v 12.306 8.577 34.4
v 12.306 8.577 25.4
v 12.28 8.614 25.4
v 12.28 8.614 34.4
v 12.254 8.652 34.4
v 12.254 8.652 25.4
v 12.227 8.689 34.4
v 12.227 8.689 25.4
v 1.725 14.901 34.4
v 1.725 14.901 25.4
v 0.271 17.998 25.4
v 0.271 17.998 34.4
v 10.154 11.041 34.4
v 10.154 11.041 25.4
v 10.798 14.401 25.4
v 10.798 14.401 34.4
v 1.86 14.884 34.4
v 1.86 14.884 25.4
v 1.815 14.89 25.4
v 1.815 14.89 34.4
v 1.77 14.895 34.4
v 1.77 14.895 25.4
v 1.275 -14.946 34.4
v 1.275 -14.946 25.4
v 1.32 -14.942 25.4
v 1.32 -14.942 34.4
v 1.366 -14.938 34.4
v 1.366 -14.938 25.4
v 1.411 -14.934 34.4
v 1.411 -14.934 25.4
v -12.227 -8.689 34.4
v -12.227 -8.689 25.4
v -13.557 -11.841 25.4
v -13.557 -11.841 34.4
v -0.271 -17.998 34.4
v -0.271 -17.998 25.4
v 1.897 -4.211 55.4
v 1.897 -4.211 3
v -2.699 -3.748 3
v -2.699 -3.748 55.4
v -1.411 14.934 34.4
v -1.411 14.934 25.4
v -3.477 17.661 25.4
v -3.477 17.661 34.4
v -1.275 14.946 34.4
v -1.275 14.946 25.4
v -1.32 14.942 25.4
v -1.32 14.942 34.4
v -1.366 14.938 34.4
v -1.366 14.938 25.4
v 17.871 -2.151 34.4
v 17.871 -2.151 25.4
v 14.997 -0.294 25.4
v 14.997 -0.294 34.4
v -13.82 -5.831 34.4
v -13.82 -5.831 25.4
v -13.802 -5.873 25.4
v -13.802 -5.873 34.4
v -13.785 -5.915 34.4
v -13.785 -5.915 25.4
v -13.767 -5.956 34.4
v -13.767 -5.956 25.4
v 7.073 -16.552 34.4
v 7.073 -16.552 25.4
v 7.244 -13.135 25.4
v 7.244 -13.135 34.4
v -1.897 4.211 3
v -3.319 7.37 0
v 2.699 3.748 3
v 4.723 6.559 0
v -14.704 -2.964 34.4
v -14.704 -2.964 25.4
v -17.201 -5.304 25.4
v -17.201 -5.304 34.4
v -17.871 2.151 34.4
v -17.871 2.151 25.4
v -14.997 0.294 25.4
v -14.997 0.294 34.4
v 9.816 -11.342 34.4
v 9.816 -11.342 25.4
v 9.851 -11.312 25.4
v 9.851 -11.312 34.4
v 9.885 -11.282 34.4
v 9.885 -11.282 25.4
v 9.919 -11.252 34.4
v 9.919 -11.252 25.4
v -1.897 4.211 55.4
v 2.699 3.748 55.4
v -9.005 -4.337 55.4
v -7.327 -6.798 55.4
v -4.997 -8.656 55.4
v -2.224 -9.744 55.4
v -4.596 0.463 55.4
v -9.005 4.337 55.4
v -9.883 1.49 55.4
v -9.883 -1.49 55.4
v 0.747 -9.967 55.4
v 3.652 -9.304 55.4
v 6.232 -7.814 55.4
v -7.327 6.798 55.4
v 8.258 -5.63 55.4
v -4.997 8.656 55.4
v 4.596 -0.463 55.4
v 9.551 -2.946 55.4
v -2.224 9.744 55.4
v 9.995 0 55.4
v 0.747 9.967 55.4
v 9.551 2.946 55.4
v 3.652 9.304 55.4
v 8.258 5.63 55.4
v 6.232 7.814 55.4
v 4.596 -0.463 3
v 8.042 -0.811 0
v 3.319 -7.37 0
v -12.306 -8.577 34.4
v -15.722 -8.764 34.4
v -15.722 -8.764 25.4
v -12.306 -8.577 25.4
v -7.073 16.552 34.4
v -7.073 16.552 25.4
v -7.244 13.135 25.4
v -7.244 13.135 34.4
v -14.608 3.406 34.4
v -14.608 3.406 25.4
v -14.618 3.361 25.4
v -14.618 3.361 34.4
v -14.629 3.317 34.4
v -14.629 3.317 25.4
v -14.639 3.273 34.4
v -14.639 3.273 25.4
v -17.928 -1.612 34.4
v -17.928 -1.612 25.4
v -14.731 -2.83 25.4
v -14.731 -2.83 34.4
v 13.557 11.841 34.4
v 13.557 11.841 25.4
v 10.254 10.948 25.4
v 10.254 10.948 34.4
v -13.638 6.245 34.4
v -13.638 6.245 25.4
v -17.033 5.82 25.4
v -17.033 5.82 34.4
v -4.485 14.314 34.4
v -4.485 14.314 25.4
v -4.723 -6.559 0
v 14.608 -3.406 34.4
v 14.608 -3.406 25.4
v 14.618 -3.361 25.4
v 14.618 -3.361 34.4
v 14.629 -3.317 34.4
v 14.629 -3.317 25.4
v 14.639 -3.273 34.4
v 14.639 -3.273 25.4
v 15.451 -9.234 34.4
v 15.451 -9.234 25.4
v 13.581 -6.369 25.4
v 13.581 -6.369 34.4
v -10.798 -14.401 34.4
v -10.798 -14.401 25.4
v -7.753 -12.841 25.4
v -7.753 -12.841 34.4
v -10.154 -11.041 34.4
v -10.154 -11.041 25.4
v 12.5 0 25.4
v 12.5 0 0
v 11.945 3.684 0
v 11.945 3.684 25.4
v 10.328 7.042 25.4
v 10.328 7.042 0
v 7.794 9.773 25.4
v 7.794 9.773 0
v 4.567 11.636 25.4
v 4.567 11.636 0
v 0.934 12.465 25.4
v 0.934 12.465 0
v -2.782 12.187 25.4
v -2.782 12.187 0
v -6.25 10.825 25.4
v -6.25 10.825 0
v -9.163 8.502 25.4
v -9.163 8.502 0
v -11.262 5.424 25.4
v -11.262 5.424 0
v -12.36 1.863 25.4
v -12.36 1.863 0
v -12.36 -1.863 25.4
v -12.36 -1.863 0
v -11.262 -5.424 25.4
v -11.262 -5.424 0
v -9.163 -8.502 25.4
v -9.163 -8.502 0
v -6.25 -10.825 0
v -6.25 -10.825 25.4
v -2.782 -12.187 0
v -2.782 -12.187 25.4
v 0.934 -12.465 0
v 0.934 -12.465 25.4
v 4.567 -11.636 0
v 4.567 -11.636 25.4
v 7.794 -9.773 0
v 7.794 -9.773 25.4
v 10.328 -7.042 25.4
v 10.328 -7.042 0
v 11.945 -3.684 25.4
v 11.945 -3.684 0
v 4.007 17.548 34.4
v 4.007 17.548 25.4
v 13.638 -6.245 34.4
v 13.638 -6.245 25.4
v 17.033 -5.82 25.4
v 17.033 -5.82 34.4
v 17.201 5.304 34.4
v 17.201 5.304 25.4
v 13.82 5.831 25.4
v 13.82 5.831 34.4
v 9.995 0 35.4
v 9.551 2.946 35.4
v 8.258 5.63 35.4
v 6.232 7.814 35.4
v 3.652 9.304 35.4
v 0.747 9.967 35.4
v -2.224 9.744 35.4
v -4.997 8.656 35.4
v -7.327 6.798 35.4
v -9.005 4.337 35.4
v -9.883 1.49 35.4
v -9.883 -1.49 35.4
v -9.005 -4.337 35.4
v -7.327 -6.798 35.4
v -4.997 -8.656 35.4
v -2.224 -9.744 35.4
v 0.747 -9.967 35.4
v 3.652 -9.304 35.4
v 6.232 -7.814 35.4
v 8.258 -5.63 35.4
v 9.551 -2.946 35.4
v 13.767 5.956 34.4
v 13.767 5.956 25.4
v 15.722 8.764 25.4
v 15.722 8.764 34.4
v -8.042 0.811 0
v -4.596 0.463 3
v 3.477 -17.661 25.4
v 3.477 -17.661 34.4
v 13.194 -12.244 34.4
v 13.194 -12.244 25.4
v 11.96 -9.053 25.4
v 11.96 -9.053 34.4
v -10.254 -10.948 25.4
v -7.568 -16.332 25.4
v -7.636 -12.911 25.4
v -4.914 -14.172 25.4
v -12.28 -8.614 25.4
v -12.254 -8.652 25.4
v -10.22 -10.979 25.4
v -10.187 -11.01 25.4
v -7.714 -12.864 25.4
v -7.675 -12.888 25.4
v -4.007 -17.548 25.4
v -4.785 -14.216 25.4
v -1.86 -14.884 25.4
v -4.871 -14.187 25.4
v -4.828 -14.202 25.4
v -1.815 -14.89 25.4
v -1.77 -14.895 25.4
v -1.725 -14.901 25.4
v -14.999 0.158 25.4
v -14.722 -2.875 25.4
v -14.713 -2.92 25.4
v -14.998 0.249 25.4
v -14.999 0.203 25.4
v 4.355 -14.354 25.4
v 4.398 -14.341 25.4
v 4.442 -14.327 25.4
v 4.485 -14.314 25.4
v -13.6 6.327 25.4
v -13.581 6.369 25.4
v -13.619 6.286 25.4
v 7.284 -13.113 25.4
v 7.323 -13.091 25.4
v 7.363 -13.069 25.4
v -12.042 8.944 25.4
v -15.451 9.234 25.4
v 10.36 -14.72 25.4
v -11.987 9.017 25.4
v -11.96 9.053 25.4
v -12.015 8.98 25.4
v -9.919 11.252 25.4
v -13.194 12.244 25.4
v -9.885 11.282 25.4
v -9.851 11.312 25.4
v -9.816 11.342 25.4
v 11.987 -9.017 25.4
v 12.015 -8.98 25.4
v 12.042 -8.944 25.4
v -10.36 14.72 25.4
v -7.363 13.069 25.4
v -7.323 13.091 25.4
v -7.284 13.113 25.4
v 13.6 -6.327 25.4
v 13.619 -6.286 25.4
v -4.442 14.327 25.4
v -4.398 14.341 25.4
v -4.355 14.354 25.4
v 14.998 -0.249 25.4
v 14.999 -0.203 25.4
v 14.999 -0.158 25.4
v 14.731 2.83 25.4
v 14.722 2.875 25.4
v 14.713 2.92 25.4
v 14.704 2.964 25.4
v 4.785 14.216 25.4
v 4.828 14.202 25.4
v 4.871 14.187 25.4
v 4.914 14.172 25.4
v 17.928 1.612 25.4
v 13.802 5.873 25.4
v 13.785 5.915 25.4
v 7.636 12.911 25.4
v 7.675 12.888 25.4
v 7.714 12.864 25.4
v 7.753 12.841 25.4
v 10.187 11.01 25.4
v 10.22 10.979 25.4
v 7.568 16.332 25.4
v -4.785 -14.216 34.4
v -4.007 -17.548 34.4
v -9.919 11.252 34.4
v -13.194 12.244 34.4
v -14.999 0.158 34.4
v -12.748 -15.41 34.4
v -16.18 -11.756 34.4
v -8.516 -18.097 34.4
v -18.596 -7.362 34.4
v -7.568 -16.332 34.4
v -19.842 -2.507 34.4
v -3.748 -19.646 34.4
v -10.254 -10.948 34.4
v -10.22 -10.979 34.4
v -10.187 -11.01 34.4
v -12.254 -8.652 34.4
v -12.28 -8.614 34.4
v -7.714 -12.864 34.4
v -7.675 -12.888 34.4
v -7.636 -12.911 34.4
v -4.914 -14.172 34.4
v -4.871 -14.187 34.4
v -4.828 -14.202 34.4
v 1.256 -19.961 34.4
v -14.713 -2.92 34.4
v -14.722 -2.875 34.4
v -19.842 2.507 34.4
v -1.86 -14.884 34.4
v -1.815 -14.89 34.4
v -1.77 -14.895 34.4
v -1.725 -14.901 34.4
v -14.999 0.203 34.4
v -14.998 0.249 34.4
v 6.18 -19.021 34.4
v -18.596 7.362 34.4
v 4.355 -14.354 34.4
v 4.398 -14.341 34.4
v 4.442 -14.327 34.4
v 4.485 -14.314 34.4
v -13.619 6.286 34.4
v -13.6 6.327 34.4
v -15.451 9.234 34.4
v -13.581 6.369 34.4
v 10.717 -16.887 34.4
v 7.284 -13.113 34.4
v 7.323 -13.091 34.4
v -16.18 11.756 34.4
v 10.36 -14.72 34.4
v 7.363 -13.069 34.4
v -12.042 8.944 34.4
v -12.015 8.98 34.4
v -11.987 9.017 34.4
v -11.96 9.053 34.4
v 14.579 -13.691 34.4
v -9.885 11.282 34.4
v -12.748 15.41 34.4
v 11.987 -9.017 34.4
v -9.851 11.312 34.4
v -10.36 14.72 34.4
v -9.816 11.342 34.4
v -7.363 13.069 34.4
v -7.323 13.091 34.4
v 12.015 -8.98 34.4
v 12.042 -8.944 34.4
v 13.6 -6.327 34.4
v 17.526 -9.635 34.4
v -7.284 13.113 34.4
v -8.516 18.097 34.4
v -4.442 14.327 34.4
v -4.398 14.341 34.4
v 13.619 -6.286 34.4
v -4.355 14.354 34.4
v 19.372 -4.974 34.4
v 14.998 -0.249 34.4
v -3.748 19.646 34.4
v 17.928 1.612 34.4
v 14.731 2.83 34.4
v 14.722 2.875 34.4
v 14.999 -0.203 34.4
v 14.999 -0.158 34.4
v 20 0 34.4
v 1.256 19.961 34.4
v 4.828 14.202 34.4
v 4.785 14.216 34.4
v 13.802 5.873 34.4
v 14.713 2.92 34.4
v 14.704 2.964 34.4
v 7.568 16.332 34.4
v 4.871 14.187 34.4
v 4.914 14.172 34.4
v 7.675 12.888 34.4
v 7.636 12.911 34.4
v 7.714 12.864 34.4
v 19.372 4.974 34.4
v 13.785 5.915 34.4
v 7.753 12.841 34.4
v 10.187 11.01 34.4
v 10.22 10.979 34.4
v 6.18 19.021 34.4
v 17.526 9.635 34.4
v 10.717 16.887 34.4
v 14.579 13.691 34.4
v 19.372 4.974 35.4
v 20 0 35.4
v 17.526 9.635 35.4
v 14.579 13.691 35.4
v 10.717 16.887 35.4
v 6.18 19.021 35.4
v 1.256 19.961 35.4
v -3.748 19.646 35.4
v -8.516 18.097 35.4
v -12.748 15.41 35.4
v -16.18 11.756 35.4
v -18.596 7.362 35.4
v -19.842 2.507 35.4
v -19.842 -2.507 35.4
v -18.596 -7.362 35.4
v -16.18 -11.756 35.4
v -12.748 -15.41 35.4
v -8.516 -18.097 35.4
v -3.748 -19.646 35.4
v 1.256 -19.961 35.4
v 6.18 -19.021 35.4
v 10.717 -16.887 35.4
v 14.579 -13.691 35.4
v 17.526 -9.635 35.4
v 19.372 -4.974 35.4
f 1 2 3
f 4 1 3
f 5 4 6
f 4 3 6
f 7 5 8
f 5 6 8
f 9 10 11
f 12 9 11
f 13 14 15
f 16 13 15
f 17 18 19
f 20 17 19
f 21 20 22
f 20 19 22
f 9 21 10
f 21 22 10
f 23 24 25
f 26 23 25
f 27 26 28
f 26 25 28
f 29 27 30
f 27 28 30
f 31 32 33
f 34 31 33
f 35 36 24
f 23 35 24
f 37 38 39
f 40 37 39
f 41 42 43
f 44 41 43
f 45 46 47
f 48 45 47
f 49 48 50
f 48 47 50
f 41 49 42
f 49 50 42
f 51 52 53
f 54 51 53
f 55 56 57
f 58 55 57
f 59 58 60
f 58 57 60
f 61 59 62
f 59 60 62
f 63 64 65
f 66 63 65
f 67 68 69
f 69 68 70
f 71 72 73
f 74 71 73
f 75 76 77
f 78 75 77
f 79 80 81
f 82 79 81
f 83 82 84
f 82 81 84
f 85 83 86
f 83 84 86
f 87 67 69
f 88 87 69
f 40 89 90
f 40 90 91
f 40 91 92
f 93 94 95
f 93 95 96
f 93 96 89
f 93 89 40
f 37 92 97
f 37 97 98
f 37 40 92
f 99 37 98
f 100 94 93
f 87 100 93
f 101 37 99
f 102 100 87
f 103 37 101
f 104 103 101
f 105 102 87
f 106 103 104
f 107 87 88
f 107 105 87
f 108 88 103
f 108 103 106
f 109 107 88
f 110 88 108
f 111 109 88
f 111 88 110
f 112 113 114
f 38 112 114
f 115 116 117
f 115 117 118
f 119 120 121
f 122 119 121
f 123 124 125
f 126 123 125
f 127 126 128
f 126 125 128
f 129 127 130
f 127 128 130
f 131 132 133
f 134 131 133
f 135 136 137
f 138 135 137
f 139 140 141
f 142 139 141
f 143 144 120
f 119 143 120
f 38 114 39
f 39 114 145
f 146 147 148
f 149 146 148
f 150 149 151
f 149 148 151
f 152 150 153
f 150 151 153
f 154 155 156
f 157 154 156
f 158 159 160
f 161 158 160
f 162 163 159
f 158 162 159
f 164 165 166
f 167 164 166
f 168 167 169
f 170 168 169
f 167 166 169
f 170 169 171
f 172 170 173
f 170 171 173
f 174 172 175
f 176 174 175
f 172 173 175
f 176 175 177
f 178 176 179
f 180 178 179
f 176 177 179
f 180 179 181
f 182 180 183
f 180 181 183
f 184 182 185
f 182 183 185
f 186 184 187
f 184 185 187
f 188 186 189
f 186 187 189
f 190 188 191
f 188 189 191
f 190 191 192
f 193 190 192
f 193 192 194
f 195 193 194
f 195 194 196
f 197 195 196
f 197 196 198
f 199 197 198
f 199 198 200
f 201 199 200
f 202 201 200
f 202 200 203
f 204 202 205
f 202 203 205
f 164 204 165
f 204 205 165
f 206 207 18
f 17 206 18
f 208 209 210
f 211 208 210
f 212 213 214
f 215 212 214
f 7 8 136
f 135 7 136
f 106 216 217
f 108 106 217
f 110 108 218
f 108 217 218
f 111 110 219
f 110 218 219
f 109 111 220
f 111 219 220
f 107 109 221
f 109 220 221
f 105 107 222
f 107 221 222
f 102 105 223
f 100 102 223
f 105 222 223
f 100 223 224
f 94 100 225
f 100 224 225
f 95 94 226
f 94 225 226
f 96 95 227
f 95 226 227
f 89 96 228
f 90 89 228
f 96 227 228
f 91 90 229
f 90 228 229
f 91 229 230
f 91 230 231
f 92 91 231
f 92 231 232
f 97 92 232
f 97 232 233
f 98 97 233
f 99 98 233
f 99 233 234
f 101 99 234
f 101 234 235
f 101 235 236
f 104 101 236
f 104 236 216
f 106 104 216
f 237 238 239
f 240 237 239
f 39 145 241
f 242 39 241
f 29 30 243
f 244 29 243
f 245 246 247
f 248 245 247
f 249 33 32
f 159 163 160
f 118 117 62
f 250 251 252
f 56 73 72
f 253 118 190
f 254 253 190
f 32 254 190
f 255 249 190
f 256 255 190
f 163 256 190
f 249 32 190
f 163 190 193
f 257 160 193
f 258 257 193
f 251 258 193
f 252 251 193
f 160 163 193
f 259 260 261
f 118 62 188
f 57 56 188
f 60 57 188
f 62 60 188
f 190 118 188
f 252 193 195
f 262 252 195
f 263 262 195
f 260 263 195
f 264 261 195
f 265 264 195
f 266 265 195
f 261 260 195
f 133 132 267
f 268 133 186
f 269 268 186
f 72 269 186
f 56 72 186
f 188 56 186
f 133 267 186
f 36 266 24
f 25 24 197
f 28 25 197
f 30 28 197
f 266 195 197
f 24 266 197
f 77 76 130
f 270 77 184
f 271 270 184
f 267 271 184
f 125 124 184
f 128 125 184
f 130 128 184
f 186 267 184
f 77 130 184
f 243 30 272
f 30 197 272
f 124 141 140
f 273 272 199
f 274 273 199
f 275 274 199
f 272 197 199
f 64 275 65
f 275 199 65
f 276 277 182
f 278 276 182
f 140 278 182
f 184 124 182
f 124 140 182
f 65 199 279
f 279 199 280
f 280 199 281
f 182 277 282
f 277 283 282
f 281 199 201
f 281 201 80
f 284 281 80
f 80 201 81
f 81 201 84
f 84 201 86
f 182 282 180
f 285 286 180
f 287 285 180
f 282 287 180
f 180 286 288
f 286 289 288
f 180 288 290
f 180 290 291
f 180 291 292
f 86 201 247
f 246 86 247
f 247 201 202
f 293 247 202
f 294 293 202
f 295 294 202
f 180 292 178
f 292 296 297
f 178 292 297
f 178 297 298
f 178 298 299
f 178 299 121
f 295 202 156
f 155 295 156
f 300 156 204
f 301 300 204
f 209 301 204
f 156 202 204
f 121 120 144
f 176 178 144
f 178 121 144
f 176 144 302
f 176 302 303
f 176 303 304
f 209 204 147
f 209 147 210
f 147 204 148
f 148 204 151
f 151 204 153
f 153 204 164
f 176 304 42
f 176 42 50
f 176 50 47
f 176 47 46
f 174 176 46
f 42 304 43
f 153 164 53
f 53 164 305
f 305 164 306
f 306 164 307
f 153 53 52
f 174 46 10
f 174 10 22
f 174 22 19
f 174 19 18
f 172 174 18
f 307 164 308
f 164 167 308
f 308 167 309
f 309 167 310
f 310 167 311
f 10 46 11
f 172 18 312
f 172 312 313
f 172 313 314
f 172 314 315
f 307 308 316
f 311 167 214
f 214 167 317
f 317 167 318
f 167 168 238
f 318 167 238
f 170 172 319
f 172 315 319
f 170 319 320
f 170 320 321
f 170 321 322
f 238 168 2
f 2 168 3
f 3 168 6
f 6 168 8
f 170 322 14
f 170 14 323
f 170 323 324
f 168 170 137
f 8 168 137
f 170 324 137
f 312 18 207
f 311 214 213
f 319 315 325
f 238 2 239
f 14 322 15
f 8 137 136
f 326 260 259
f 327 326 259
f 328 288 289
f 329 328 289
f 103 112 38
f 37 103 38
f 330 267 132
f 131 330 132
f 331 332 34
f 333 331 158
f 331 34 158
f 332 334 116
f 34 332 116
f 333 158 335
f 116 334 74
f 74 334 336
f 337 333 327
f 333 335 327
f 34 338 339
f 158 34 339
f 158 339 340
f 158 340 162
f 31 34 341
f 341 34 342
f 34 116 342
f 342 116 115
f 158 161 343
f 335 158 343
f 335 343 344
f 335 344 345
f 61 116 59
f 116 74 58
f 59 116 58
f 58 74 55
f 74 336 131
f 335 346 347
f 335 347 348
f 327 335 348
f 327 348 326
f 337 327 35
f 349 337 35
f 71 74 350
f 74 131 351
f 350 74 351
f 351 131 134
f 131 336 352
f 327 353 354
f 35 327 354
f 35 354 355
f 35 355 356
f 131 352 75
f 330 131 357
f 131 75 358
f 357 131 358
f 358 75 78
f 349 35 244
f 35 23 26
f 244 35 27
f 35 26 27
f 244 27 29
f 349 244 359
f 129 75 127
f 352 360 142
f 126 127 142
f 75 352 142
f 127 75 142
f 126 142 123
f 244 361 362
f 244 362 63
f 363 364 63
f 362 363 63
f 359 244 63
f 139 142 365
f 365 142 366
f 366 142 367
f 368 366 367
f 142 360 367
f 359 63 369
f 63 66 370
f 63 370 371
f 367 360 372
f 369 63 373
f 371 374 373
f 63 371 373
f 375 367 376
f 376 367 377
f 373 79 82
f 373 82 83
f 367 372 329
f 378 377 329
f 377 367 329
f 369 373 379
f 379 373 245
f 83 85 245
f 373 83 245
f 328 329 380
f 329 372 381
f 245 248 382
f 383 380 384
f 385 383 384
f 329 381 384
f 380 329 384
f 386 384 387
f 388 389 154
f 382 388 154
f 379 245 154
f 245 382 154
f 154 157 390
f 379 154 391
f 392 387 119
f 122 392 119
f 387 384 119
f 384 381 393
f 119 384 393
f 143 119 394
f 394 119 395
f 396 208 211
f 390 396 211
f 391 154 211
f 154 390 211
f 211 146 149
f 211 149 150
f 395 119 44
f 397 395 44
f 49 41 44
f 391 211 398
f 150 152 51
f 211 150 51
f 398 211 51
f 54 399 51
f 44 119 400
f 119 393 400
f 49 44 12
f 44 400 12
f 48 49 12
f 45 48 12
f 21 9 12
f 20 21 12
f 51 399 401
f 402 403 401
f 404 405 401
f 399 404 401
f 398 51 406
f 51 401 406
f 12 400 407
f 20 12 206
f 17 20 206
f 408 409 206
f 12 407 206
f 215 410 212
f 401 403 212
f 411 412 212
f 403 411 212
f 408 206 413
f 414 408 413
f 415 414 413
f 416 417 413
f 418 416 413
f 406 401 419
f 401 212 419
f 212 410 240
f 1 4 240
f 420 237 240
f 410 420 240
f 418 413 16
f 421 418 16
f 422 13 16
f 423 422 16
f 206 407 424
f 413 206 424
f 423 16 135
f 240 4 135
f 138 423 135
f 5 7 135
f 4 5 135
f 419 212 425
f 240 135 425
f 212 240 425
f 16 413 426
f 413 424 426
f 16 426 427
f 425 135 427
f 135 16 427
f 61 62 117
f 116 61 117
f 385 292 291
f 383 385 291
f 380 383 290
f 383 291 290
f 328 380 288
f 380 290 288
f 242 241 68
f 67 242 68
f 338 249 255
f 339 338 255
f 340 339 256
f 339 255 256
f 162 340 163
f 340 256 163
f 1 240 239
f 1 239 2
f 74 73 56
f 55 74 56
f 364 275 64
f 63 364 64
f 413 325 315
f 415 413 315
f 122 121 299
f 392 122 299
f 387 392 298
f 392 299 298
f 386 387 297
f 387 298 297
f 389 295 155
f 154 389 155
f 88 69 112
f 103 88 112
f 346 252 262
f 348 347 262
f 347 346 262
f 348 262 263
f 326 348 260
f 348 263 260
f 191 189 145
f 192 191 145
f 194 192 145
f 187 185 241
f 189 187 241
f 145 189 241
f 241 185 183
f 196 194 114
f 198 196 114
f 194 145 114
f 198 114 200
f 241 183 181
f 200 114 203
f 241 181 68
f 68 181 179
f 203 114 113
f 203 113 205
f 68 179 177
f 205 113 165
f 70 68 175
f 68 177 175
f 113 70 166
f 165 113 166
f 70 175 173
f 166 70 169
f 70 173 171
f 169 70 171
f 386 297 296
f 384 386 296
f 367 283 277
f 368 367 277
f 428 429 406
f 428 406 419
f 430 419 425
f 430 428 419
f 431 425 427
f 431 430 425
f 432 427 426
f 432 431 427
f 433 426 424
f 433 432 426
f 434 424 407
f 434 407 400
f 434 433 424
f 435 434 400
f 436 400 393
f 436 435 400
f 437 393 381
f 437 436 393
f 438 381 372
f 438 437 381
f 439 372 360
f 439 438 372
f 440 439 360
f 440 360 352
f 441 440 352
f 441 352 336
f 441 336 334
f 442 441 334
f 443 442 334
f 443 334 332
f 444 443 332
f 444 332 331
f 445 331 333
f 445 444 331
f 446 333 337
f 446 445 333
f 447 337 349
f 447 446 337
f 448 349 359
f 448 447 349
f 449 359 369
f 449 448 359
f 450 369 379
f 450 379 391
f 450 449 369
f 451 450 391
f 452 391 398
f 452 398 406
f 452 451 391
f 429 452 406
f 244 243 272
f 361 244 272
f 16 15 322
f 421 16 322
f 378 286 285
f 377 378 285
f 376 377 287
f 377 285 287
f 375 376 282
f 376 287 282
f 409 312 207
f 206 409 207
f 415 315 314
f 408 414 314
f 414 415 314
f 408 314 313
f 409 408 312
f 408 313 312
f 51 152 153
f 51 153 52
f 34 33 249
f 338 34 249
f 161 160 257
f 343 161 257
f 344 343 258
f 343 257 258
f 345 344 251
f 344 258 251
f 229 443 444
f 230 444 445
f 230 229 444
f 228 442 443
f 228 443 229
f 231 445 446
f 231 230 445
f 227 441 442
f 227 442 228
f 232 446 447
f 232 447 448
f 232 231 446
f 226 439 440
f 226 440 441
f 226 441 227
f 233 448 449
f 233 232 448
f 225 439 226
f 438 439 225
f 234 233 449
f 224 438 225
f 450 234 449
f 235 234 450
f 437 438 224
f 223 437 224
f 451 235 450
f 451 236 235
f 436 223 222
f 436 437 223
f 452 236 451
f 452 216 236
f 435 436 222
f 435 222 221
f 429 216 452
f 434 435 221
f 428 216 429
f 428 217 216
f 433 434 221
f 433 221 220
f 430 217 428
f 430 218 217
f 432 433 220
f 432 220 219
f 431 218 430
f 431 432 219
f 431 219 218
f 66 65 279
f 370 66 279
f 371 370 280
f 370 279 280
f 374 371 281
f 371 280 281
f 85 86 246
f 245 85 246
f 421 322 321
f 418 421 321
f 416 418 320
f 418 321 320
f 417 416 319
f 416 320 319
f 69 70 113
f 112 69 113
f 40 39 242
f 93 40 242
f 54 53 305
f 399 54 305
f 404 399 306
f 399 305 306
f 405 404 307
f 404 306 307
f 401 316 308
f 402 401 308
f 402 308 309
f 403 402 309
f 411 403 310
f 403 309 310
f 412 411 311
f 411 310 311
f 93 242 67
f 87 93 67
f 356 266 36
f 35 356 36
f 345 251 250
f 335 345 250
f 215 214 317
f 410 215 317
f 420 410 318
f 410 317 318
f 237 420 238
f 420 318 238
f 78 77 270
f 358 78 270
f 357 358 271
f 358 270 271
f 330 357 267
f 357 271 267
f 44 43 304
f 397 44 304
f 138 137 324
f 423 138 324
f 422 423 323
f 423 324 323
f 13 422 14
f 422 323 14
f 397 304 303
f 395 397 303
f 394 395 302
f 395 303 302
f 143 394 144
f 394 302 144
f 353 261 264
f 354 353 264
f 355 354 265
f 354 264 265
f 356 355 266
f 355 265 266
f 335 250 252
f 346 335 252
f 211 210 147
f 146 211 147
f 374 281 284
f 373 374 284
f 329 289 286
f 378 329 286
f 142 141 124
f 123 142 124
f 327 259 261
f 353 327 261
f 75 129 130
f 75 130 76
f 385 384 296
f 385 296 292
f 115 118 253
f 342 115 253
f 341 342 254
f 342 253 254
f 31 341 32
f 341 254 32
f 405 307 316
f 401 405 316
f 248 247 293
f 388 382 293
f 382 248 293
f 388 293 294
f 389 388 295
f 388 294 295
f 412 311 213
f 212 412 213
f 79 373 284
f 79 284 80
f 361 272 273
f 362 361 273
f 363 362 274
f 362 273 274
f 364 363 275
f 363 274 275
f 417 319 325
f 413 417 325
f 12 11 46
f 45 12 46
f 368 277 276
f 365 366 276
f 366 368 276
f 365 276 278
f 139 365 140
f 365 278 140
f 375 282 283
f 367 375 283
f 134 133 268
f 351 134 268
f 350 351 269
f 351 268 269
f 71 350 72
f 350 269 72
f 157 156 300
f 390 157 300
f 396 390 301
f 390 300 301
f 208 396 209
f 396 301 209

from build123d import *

# Parameters (mm, degrees)
SKETCH1_R               = 12.5
BOSS_EXTRUDE1_DEPTH     = 25.4
SKETCH2_R               = 9.9949
BOSS_EXTRUDE2_DEPTH     = 30
SKETCH4_R               = 15
BOSS_EXTRUDE3_DEPTH     = 10
SKETCH5_R               = 20
BOSS_EXTRUDE4_DEPTH     = 1
CUT_EXTRUDE1_DEPTH      = 1
CUT_EXTRUDE1_DEPTH_BACK = 56.4
CHAMFER1_SIZE           = 3


with BuildPart() as part:
    # Sketch1 → Boss-Extrude1 (new body)
    with BuildSketch(Plane.XY):
        Circle(SKETCH1_R)
    extrude(amount=BOSS_EXTRUDE1_DEPTH)

    # Sketch2 → Boss-Extrude2 (add)
    with BuildSketch(Plane.XY.offset(25.4)):
        Circle(SKETCH2_R)
    extrude(amount=BOSS_EXTRUDE2_DEPTH)

    # Sketch4 → Boss-Extrude3 (add)
    with BuildSketch(Plane.XY.offset(25.4)):
        Circle(SKETCH4_R)
        with BuildLine():
            ThreePointArc((-14.997117089, 0.294073132), (-14.892515339, 1.792480649), (-14.638580274, 3.272914233))
            Line((-14.638580274, 3.272914233), (-17.871018407, 2.150976779))
            Line((-17.871018407, 2.150976779), (-14.997117089, 0.294073132))
        make_face()
        with BuildLine():
            ThreePointArc((-14.730535341, -2.830429043), (-14.93975583, -1.343017399), (-14.999169305, 0.157861228))
            Line((-14.999169305, 0.157861228), (-17.927706996, -1.611620878))
            Line((-17.927706996, -1.611620878), (-14.730535341, -2.830429043))
        make_face()
        with BuildLine():
            ThreePointArc((-14.608252857, 3.4057229), (-14.194400465, 4.849638691), (-13.638215041, 6.24492518))
            Line((-13.638215041, 6.24492518), (-17.033280558, 5.819566429))
            Line((-17.033280558, 5.819566429), (-14.608252857, 3.4057229))
        make_face()
        with BuildLine():
            ThreePointArc((-13.580937876, 6.368526235), (-12.875922179, 7.694844251), (-12.041794367, 8.94400293))
            Line((-12.041794367, 8.94400293), (-15.451106615, 9.233813101))
            Line((-15.451106615, 9.233813101), (-13.580937876, 6.368526235))
        make_face()
        with BuildLine():
            ThreePointArc((-11.960070742, 9.052994413), (-10.994704308, 10.203748193), (-9.919089497, 11.252184835))
            Line((-9.919089497, 11.252184835), (-13.193645169, 12.244497832))
            Line((-13.193645169, 12.244497832), (-11.960070742, 9.052994413))
        make_face()
        with BuildLine():
            ThreePointArc((-9.816491125, 11.341803295), (-8.6329651, 12.266699376), (-7.362872818, 13.068592268))
            Line((-7.362872818, 13.068592268), (-10.35955812, 14.720039251))
            Line((-10.35955812, 14.720039251), (-9.816491125, 11.341803295))
        make_face()
        with BuildLine():
            ThreePointArc((-7.243883742, 13.134920949), (-5.893923892, 13.793536934), (-4.484863267, 14.313839509))
            Line((-4.484863267, 14.313839509), (-7.07270867, 16.552244321))
            Line((-7.07270867, 16.552244321), (-7.243883742, 13.134920949))
        make_face()
        with BuildLine():
            ThreePointArc((-4.354683879, 14.353979529), (-2.897289927, 14.71753074), (-1.41084367, 14.933503278))
            Line((-1.41084367, 14.933503278), (-3.476747913, 17.661036888))
            Line((-3.476747913, 17.661036888), (-4.354683879, 14.353979529))
        make_face()
        with BuildLine():
            Line((1.724836566, 14.900501294), (0.271163412, 17.997957395))
            Line((0.271163412, 17.997957395), (-1.275163434, 14.945700325))
            ThreePointArc((-1.275163434, 14.945700325), (0.22596951, 14.998297829), (1.724836566, 14.900501294))
        make_face()
        with BuildLine():
            Line((4.007223594, 17.548280801), (1.860087771, 14.8842223))
            ThreePointArc((1.860087771, 14.8842223), (3.339352995, 14.623567334), (4.785133167, 14.216275904))
            Line((4.785133167, 14.216275904), (4.007223594, 17.548280801))
        make_face()
        with BuildLine():
            Line((7.568148876, 16.331660129), (4.914044216, 14.172232338))
            ThreePointArc((4.914044216, 14.172232338), (6.30679073, 13.609716775), (7.636296486, 12.910731039))
            Line((7.636296486, 12.910731039), (7.568148876, 16.331660129))
        make_face()
        with BuildLine():
            Line((10.798309737, 14.401267542), (7.753233347, 12.840847817))
            ThreePointArc((7.753233347, 12.840847817), (8.998591447, 12.001056285), (10.153717007, 11.040925276))
            Line((10.153717007, 11.040925276), (10.798309737, 14.401267542))
        make_face()
        with BuildLine():
            Line((13.556532646, 11.841470459), (10.253568978, 10.948256629))
            ThreePointArc((10.253568978, 10.948256629), (11.297110538, 9.867892049), (12.227371371, 8.688578098))
            Line((12.227371371, 8.688578098), (13.556532646, 11.841470459))
        make_face()
        with BuildLine():
            Line((15.722270026, 8.764144294), (12.305774442, 8.577174091))
            ThreePointArc((12.305774442, 8.577174091), (13.101891689, 7.303453579), (13.766630933, 5.956498364))
            Line((13.766630933, 5.956498364), (15.722270026, 8.764144294))
        make_face()
        with BuildLine():
            Line((17.200868763, 5.303782969), (13.820158513, 5.831227887))
            ThreePointArc((13.820158513, 5.831227887), (14.334057303, 4.419819141), (14.704222663, 2.964091069))
            Line((14.704222663, 2.964091069), (17.200868763, 5.303782969))
        make_face()
        with BuildLine():
            Line((17.927706996, 1.611620878), (14.730535341, 2.830429043))
            ThreePointArc((14.730535341, 2.830429043), (14.932481879, 1.4216135), (15, 0))
            ThreePointArc((15, 0), (14.999792325, -0.078931707), (14.999169305, -0.157861228))
            Line((14.999169305, -0.157861228), (17.927706996, 1.611620878))
        make_face()
        with BuildLine():
            Line((17.871018407, -2.150976779), (14.997117089, -0.294073132))
            ThreePointArc((14.997117089, -0.294073132), (14.892515339, -1.792480649), (14.638580274, -3.272914233))
            Line((14.638580274, -3.272914233), (17.871018407, -2.150976779))
        make_face()
        with BuildLine():
            Line((17.033280558, -5.819566429), (14.608252857, -3.4057229))
            ThreePointArc((14.608252857, -3.4057229), (14.194400465, -4.849638691), (13.638215041, -6.24492518))
            Line((13.638215041, -6.24492518), (17.033280558, -5.819566429))
        make_face()
        with BuildLine():
            Line((15.451106615, -9.233813101), (13.580937876, -6.368526235))
            ThreePointArc((13.580937876, -6.368526235), (12.875922179, -7.694844251), (12.041794367, -8.94400293))
            Line((12.041794367, -8.94400293), (15.451106615, -9.233813101))
        make_face()
        with BuildLine():
            Line((13.193645169, -12.244497832), (11.960070742, -9.052994413))
            ThreePointArc((11.960070742, -9.052994413), (10.994704308, -10.203748193), (9.919089497, -11.252184835))
            Line((9.919089497, -11.252184835), (13.193645169, -12.244497832))
        make_face()
        with BuildLine():
            Line((10.35955812, -14.720039251), (9.816491125, -11.341803295))
            ThreePointArc((9.816491125, -11.341803295), (8.6329651, -12.266699376), (7.362872818, -13.068592268))
            Line((7.362872818, -13.068592268), (10.35955812, -14.720039251))
        make_face()
        with BuildLine():
            Line((7.07270867, -16.552244321), (7.243883742, -13.134920949))
            ThreePointArc((7.243883742, -13.134920949), (5.893923892, -13.793536934), (4.484863267, -14.313839509))
            Line((4.484863267, -14.313839509), (7.07270867, -16.552244321))
        make_face()
        with BuildLine():
            Line((3.476747913, -17.661036888), (4.354683879, -14.353979529))
            ThreePointArc((4.354683879, -14.353979529), (2.897289927, -14.71753074), (1.41084367, -14.933503278))
            Line((1.41084367, -14.933503278), (3.476747913, -17.661036888))
        make_face()
        with BuildLine():
            ThreePointArc((1.275163434, -14.945700325), (-0.22596951, -14.998297829), (-1.724836566, -14.900501294))
            Line((-1.724836566, -14.900501294), (-0.271163412, -17.997957395))
            Line((-0.271163412, -17.997957395), (1.275163434, -14.945700325))
        make_face()
        with BuildLine():
            ThreePointArc((-1.860087771, -14.8842223), (-3.339352995, -14.623567334), (-4.785133167, -14.216275904))
            Line((-4.785133167, -14.216275904), (-4.007223594, -17.548280801))
            Line((-4.007223594, -17.548280801), (-1.860087771, -14.8842223))
        make_face()
        with BuildLine():
            ThreePointArc((-4.914044216, -14.172232338), (-6.30679073, -13.609716775), (-7.636296486, -12.910731039))
            Line((-7.636296486, -12.910731039), (-7.568148876, -16.331660129))
            Line((-7.568148876, -16.331660129), (-4.914044216, -14.172232338))
        make_face()
        with BuildLine():
            ThreePointArc((-7.753233347, -12.840847817), (-8.998591447, -12.001056285), (-10.153717007, -11.040925276))
            Line((-10.153717007, -11.040925276), (-10.798309737, -14.401267542))
            Line((-10.798309737, -14.401267542), (-7.753233347, -12.840847817))
        make_face()
        with BuildLine():
            ThreePointArc((-10.253568978, -10.948256629), (-11.297110538, -9.867892049), (-12.227371371, -8.688578098))
            Line((-12.227371371, -8.688578098), (-13.556532646, -11.841470459))
            Line((-13.556532646, -11.841470459), (-10.253568978, -10.948256629))
        make_face()
        with BuildLine():
            ThreePointArc((-12.305774442, -8.577174091), (-13.101891689, -7.303453579), (-13.766630933, -5.956498364))
            Line((-13.766630933, -5.956498364), (-15.722270026, -8.764144294))
            Line((-15.722270026, -8.764144294), (-12.305774442, -8.577174091))
        make_face()
        with BuildLine():
            ThreePointArc((-13.820158513, -5.831227887), (-14.334057303, -4.419819141), (-14.704222663, -2.964091069))
            Line((-14.704222663, -2.964091069), (-17.200868763, -5.303782969))
            Line((-17.200868763, -5.303782969), (-13.820158513, -5.831227887))
        make_face()
    extrude(amount=BOSS_EXTRUDE3_DEPTH)

    # Sketch5 → Boss-Extrude4 (add)
    with BuildSketch(Plane.XY.offset(35.4)):
        Circle(SKETCH5_R)
    extrude(amount=-BOSS_EXTRUDE4_DEPTH)

    # Sketch3 → Cut-Extrude1 (cut, two sides)
    with BuildSketch(Plane(origin=(0, 0, 0), x_dir=(-1, 0, 0), z_dir=(0, 0, -1))) as cut_extrude1_sk:
        Polygon((1.896610387, 4.211437091), (-2.698906314, 3.748231322), (-4.595516701, -0.46320577), (-1.896610387, -4.211437091), (2.698906314, -3.748231322), (4.595516701, 0.46320577), align=None)
    extrude(amount=CUT_EXTRUDE1_DEPTH, mode=Mode.SUBTRACT)
    extrude(cut_extrude1_sk.sketch, amount=-CUT_EXTRUDE1_DEPTH_BACK, mode=Mode.SUBTRACT)

    # Chamfer1
    chamfer1_edges = [part.edges().sort_by_distance(p)[0] for p in [
        (-3.246063544, 2.337321431, 0),
        (-3.647211508, -1.642512776, 0),
        (-0.401147964, -3.979834206, 0),
        (3.246063544, -2.337321431, 0),
        (3.647211508, 1.642512776, 0),
        (0.401147964, 3.979834206, 0),
    ]]
    chamfer(chamfer1_edges, length=CHAMFER1_SIZE)


solid = part.part
